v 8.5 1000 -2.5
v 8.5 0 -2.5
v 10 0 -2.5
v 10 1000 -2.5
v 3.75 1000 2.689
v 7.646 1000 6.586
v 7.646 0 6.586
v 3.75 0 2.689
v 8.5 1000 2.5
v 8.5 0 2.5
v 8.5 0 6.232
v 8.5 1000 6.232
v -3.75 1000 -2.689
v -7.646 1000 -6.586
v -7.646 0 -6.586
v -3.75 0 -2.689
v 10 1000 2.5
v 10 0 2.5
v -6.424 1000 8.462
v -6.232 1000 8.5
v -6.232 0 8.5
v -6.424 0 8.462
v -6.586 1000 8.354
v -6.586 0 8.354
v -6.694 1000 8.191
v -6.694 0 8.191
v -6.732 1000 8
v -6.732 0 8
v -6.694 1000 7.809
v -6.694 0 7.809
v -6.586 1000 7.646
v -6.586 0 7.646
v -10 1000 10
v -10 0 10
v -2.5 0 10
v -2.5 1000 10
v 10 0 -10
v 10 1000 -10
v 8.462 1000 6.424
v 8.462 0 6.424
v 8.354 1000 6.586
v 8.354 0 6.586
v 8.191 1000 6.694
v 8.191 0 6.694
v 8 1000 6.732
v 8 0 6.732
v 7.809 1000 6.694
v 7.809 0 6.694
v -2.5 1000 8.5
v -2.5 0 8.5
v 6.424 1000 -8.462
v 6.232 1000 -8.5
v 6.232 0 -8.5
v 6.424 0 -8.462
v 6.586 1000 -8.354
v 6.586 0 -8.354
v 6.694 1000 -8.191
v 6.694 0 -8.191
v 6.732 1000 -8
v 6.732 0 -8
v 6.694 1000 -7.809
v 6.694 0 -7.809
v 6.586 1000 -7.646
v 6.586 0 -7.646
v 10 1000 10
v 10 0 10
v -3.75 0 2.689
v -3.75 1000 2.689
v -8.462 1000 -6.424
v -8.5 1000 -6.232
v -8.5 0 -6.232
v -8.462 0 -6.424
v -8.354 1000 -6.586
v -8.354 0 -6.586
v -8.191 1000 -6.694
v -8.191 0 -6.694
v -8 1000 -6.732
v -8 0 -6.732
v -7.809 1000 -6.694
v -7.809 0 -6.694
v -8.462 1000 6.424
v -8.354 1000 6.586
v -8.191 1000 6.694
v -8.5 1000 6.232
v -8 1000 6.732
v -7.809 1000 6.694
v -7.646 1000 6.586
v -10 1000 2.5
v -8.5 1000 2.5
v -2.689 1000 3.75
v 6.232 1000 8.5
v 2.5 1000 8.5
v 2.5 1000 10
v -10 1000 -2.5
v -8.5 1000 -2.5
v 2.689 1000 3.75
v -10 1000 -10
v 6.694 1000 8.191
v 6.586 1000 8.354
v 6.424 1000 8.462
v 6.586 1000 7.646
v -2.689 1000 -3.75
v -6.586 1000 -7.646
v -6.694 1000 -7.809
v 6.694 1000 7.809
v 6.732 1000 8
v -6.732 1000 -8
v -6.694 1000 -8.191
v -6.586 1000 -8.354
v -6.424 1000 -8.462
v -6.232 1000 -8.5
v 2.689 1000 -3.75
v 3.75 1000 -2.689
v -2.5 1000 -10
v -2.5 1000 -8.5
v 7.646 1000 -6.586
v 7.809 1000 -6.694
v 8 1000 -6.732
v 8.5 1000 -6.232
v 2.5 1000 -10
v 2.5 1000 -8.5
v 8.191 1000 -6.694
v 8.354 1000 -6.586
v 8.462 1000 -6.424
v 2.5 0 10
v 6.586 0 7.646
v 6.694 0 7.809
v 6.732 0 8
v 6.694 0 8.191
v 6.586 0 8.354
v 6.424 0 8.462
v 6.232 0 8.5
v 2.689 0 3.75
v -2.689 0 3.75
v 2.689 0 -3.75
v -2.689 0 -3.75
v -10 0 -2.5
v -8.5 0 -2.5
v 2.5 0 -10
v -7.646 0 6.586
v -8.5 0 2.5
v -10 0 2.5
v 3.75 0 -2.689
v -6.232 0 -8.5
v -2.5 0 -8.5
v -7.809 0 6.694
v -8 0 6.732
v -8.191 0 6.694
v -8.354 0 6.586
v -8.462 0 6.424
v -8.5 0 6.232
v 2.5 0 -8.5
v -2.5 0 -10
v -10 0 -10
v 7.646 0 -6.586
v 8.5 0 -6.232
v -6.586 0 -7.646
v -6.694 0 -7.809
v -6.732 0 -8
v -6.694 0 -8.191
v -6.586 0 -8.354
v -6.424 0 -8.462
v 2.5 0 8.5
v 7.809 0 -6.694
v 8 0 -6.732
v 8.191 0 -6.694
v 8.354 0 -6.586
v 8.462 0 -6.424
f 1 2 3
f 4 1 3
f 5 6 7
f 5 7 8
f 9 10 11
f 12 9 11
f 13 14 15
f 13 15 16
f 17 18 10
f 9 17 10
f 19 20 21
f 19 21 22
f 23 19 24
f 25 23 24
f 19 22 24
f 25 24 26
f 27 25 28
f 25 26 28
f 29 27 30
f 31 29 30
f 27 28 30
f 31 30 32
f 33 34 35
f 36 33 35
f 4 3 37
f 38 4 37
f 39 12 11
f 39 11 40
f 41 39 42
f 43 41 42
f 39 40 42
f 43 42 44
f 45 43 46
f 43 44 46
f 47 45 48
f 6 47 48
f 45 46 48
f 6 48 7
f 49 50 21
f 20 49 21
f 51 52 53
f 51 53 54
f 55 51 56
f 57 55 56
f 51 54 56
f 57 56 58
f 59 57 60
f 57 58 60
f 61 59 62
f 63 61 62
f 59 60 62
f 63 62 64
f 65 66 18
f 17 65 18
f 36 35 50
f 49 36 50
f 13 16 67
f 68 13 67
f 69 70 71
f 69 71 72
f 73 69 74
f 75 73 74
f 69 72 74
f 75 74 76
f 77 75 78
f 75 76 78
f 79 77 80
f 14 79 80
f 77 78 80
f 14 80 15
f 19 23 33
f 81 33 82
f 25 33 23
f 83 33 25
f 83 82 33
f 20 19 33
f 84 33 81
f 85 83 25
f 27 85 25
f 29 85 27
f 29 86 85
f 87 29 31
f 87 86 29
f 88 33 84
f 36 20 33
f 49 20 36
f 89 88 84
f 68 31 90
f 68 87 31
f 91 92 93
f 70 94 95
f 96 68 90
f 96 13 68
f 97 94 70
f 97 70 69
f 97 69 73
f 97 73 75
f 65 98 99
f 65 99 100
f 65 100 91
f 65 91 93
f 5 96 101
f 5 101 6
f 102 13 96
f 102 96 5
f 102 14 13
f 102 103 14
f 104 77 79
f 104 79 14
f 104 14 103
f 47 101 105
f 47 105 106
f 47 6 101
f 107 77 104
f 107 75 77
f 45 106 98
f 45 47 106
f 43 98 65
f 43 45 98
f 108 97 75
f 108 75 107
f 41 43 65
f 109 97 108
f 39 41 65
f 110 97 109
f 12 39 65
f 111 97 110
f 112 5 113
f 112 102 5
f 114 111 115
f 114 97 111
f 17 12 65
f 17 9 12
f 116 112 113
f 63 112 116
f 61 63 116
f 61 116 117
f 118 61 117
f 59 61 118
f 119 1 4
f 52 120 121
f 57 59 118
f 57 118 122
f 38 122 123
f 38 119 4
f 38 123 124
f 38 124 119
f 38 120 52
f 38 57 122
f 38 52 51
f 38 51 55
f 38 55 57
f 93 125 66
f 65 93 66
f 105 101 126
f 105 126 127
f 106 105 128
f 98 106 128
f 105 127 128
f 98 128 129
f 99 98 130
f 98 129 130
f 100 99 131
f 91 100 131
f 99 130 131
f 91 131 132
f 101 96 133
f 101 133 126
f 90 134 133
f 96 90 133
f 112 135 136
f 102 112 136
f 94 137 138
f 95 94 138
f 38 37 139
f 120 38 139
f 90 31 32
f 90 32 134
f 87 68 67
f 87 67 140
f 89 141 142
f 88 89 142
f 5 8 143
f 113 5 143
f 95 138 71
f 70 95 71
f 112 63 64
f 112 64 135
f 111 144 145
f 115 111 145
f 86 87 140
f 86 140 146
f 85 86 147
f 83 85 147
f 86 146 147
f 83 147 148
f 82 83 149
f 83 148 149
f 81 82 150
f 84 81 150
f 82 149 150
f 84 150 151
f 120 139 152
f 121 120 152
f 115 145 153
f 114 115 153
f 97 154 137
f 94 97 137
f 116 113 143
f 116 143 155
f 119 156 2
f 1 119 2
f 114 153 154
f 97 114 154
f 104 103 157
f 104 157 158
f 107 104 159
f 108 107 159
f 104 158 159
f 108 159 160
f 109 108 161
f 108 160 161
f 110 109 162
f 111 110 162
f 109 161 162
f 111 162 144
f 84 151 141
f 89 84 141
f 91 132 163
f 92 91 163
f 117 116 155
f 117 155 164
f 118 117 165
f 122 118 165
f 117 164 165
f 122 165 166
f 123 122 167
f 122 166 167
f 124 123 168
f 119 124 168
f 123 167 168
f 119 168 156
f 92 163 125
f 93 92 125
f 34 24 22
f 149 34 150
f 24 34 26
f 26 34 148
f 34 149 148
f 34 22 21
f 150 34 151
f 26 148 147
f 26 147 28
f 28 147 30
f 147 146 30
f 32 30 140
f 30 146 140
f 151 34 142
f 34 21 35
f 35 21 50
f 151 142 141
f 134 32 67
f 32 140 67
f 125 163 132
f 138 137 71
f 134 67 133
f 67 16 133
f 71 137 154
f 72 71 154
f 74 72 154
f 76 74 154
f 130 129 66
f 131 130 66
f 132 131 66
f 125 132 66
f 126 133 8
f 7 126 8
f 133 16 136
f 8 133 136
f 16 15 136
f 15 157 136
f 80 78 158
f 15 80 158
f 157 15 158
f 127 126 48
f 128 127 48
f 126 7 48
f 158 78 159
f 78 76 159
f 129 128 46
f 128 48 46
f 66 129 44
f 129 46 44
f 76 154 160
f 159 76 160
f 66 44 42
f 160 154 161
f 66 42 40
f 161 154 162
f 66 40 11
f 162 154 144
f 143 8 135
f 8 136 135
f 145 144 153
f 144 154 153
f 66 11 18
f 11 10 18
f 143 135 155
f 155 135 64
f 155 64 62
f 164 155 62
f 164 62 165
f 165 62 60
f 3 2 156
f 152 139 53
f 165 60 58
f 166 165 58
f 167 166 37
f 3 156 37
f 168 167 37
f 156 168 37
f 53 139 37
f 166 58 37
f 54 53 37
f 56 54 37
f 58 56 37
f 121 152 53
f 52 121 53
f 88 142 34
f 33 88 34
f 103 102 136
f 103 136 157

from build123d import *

# Parameters (mm, degrees)
BOSS_EXTRU_1_DEPTH = 1000


with BuildPart() as part:
    # Esquisse1 → Boss.-Extru.1 (new body)
    with BuildSketch(Plane(origin=(0, 0, 0), x_dir=(1, 0, 0), z_dir=(0, 1, 0))):
        with BuildLine():
            Line((-10, -2.5), (-10, -10))
            Line((-10, -10), (-2.5, -10))
            Line((-2.5, -10), (-2.5, -8.5))
            Line((-2.5, -8.5), (-6.232233047, -8.5))
            ThreePointArc((-6.232233047, -8.5), (-6.694172813, -8.191341716), (-6.585786438, -7.646446609))
            Line((-6.585786438, -7.646446609), (-2.689339828, -3.75))
            Line((-2.689339828, -3.75), (2.689339828, -3.75))
            Line((2.689339828, -3.75), (6.585786438, -7.646446609))
            ThreePointArc((6.585786438, -7.646446609), (6.694172813, -8.191341716), (6.232233047, -8.5))
            Line((6.232233047, -8.5), (2.5, -8.5))
            Line((2.5, -8.5), (2.5, -10))
            Line((2.5, -10), (10, -10))
            Line((10, -10), (10, -2.5))
            Line((10, -2.5), (8.5, -2.5))
            Line((8.5, -2.5), (8.5, -6.232233047))
            ThreePointArc((8.5, -6.232233047), (8.191341716, -6.694172813), (7.646446609, -6.585786438))
            Line((7.646446609, -6.585786438), (3.75, -2.689339828))
            Line((3.75, -2.689339828), (3.75, 2.689339828))
            Line((3.75, 2.689339828), (7.646446609, 6.585786438))
            ThreePointArc((7.646446609, 6.585786438), (8.191341716, 6.694172813), (8.5, 6.232233047))
            Line((8.5, 6.232233047), (8.5, 2.5))
            Line((8.5, 2.5), (10, 2.5))
            Line((10, 2.5), (10, 10))
            Line((10, 10), (2.5, 10))
            Line((2.5, 10), (2.5, 8.5))
            Line((2.5, 8.5), (6.232233047, 8.5))
            ThreePointArc((6.232233047, 8.5), (6.694172813, 8.191341716), (6.585786438, 7.646446609))
            Line((6.585786438, 7.646446609), (2.689339828, 3.75))
            Line((2.689339828, 3.75), (-2.689339828, 3.75))
            Line((-2.689339828, 3.75), (-6.585786438, 7.646446609))
            ThreePointArc((-6.585786438, 7.646446609), (-6.694172813, 8.191341716), (-6.232233047, 8.5))
            Line((-6.232233047, 8.5), (-2.5, 8.5))
            Line((-2.5, 8.5), (-2.5, 10))
            Line((-2.5, 10), (-10, 10))
            Line((-10, 10), (-10, 2.5))
            Line((-10, 2.5), (-8.5, 2.5))
            Line((-8.5, 2.5), (-8.5, 6.232233047))
            ThreePointArc((-8.5, 6.232233047), (-8.191341716, 6.694172813), (-7.646446609, 6.585786438))
            Line((-7.646446609, 6.585786438), (-3.75, 2.689339828))
            Line((-3.75, 2.689339828), (-3.75, -2.689339828))
            Line((-3.75, -2.689339828), (-7.646446609, -6.585786438))
            ThreePointArc((-7.646446609, -6.585786438), (-8.191341716, -6.694172813), (-8.5, -6.232233047))
            Line((-8.5, -6.232233047), (-8.5, -2.5))
            Line((-8.5, -2.5), (-10, -2.5))
        make_face()
    extrude(amount=BOSS_EXTRU_1_DEPTH)


solid = part.part
